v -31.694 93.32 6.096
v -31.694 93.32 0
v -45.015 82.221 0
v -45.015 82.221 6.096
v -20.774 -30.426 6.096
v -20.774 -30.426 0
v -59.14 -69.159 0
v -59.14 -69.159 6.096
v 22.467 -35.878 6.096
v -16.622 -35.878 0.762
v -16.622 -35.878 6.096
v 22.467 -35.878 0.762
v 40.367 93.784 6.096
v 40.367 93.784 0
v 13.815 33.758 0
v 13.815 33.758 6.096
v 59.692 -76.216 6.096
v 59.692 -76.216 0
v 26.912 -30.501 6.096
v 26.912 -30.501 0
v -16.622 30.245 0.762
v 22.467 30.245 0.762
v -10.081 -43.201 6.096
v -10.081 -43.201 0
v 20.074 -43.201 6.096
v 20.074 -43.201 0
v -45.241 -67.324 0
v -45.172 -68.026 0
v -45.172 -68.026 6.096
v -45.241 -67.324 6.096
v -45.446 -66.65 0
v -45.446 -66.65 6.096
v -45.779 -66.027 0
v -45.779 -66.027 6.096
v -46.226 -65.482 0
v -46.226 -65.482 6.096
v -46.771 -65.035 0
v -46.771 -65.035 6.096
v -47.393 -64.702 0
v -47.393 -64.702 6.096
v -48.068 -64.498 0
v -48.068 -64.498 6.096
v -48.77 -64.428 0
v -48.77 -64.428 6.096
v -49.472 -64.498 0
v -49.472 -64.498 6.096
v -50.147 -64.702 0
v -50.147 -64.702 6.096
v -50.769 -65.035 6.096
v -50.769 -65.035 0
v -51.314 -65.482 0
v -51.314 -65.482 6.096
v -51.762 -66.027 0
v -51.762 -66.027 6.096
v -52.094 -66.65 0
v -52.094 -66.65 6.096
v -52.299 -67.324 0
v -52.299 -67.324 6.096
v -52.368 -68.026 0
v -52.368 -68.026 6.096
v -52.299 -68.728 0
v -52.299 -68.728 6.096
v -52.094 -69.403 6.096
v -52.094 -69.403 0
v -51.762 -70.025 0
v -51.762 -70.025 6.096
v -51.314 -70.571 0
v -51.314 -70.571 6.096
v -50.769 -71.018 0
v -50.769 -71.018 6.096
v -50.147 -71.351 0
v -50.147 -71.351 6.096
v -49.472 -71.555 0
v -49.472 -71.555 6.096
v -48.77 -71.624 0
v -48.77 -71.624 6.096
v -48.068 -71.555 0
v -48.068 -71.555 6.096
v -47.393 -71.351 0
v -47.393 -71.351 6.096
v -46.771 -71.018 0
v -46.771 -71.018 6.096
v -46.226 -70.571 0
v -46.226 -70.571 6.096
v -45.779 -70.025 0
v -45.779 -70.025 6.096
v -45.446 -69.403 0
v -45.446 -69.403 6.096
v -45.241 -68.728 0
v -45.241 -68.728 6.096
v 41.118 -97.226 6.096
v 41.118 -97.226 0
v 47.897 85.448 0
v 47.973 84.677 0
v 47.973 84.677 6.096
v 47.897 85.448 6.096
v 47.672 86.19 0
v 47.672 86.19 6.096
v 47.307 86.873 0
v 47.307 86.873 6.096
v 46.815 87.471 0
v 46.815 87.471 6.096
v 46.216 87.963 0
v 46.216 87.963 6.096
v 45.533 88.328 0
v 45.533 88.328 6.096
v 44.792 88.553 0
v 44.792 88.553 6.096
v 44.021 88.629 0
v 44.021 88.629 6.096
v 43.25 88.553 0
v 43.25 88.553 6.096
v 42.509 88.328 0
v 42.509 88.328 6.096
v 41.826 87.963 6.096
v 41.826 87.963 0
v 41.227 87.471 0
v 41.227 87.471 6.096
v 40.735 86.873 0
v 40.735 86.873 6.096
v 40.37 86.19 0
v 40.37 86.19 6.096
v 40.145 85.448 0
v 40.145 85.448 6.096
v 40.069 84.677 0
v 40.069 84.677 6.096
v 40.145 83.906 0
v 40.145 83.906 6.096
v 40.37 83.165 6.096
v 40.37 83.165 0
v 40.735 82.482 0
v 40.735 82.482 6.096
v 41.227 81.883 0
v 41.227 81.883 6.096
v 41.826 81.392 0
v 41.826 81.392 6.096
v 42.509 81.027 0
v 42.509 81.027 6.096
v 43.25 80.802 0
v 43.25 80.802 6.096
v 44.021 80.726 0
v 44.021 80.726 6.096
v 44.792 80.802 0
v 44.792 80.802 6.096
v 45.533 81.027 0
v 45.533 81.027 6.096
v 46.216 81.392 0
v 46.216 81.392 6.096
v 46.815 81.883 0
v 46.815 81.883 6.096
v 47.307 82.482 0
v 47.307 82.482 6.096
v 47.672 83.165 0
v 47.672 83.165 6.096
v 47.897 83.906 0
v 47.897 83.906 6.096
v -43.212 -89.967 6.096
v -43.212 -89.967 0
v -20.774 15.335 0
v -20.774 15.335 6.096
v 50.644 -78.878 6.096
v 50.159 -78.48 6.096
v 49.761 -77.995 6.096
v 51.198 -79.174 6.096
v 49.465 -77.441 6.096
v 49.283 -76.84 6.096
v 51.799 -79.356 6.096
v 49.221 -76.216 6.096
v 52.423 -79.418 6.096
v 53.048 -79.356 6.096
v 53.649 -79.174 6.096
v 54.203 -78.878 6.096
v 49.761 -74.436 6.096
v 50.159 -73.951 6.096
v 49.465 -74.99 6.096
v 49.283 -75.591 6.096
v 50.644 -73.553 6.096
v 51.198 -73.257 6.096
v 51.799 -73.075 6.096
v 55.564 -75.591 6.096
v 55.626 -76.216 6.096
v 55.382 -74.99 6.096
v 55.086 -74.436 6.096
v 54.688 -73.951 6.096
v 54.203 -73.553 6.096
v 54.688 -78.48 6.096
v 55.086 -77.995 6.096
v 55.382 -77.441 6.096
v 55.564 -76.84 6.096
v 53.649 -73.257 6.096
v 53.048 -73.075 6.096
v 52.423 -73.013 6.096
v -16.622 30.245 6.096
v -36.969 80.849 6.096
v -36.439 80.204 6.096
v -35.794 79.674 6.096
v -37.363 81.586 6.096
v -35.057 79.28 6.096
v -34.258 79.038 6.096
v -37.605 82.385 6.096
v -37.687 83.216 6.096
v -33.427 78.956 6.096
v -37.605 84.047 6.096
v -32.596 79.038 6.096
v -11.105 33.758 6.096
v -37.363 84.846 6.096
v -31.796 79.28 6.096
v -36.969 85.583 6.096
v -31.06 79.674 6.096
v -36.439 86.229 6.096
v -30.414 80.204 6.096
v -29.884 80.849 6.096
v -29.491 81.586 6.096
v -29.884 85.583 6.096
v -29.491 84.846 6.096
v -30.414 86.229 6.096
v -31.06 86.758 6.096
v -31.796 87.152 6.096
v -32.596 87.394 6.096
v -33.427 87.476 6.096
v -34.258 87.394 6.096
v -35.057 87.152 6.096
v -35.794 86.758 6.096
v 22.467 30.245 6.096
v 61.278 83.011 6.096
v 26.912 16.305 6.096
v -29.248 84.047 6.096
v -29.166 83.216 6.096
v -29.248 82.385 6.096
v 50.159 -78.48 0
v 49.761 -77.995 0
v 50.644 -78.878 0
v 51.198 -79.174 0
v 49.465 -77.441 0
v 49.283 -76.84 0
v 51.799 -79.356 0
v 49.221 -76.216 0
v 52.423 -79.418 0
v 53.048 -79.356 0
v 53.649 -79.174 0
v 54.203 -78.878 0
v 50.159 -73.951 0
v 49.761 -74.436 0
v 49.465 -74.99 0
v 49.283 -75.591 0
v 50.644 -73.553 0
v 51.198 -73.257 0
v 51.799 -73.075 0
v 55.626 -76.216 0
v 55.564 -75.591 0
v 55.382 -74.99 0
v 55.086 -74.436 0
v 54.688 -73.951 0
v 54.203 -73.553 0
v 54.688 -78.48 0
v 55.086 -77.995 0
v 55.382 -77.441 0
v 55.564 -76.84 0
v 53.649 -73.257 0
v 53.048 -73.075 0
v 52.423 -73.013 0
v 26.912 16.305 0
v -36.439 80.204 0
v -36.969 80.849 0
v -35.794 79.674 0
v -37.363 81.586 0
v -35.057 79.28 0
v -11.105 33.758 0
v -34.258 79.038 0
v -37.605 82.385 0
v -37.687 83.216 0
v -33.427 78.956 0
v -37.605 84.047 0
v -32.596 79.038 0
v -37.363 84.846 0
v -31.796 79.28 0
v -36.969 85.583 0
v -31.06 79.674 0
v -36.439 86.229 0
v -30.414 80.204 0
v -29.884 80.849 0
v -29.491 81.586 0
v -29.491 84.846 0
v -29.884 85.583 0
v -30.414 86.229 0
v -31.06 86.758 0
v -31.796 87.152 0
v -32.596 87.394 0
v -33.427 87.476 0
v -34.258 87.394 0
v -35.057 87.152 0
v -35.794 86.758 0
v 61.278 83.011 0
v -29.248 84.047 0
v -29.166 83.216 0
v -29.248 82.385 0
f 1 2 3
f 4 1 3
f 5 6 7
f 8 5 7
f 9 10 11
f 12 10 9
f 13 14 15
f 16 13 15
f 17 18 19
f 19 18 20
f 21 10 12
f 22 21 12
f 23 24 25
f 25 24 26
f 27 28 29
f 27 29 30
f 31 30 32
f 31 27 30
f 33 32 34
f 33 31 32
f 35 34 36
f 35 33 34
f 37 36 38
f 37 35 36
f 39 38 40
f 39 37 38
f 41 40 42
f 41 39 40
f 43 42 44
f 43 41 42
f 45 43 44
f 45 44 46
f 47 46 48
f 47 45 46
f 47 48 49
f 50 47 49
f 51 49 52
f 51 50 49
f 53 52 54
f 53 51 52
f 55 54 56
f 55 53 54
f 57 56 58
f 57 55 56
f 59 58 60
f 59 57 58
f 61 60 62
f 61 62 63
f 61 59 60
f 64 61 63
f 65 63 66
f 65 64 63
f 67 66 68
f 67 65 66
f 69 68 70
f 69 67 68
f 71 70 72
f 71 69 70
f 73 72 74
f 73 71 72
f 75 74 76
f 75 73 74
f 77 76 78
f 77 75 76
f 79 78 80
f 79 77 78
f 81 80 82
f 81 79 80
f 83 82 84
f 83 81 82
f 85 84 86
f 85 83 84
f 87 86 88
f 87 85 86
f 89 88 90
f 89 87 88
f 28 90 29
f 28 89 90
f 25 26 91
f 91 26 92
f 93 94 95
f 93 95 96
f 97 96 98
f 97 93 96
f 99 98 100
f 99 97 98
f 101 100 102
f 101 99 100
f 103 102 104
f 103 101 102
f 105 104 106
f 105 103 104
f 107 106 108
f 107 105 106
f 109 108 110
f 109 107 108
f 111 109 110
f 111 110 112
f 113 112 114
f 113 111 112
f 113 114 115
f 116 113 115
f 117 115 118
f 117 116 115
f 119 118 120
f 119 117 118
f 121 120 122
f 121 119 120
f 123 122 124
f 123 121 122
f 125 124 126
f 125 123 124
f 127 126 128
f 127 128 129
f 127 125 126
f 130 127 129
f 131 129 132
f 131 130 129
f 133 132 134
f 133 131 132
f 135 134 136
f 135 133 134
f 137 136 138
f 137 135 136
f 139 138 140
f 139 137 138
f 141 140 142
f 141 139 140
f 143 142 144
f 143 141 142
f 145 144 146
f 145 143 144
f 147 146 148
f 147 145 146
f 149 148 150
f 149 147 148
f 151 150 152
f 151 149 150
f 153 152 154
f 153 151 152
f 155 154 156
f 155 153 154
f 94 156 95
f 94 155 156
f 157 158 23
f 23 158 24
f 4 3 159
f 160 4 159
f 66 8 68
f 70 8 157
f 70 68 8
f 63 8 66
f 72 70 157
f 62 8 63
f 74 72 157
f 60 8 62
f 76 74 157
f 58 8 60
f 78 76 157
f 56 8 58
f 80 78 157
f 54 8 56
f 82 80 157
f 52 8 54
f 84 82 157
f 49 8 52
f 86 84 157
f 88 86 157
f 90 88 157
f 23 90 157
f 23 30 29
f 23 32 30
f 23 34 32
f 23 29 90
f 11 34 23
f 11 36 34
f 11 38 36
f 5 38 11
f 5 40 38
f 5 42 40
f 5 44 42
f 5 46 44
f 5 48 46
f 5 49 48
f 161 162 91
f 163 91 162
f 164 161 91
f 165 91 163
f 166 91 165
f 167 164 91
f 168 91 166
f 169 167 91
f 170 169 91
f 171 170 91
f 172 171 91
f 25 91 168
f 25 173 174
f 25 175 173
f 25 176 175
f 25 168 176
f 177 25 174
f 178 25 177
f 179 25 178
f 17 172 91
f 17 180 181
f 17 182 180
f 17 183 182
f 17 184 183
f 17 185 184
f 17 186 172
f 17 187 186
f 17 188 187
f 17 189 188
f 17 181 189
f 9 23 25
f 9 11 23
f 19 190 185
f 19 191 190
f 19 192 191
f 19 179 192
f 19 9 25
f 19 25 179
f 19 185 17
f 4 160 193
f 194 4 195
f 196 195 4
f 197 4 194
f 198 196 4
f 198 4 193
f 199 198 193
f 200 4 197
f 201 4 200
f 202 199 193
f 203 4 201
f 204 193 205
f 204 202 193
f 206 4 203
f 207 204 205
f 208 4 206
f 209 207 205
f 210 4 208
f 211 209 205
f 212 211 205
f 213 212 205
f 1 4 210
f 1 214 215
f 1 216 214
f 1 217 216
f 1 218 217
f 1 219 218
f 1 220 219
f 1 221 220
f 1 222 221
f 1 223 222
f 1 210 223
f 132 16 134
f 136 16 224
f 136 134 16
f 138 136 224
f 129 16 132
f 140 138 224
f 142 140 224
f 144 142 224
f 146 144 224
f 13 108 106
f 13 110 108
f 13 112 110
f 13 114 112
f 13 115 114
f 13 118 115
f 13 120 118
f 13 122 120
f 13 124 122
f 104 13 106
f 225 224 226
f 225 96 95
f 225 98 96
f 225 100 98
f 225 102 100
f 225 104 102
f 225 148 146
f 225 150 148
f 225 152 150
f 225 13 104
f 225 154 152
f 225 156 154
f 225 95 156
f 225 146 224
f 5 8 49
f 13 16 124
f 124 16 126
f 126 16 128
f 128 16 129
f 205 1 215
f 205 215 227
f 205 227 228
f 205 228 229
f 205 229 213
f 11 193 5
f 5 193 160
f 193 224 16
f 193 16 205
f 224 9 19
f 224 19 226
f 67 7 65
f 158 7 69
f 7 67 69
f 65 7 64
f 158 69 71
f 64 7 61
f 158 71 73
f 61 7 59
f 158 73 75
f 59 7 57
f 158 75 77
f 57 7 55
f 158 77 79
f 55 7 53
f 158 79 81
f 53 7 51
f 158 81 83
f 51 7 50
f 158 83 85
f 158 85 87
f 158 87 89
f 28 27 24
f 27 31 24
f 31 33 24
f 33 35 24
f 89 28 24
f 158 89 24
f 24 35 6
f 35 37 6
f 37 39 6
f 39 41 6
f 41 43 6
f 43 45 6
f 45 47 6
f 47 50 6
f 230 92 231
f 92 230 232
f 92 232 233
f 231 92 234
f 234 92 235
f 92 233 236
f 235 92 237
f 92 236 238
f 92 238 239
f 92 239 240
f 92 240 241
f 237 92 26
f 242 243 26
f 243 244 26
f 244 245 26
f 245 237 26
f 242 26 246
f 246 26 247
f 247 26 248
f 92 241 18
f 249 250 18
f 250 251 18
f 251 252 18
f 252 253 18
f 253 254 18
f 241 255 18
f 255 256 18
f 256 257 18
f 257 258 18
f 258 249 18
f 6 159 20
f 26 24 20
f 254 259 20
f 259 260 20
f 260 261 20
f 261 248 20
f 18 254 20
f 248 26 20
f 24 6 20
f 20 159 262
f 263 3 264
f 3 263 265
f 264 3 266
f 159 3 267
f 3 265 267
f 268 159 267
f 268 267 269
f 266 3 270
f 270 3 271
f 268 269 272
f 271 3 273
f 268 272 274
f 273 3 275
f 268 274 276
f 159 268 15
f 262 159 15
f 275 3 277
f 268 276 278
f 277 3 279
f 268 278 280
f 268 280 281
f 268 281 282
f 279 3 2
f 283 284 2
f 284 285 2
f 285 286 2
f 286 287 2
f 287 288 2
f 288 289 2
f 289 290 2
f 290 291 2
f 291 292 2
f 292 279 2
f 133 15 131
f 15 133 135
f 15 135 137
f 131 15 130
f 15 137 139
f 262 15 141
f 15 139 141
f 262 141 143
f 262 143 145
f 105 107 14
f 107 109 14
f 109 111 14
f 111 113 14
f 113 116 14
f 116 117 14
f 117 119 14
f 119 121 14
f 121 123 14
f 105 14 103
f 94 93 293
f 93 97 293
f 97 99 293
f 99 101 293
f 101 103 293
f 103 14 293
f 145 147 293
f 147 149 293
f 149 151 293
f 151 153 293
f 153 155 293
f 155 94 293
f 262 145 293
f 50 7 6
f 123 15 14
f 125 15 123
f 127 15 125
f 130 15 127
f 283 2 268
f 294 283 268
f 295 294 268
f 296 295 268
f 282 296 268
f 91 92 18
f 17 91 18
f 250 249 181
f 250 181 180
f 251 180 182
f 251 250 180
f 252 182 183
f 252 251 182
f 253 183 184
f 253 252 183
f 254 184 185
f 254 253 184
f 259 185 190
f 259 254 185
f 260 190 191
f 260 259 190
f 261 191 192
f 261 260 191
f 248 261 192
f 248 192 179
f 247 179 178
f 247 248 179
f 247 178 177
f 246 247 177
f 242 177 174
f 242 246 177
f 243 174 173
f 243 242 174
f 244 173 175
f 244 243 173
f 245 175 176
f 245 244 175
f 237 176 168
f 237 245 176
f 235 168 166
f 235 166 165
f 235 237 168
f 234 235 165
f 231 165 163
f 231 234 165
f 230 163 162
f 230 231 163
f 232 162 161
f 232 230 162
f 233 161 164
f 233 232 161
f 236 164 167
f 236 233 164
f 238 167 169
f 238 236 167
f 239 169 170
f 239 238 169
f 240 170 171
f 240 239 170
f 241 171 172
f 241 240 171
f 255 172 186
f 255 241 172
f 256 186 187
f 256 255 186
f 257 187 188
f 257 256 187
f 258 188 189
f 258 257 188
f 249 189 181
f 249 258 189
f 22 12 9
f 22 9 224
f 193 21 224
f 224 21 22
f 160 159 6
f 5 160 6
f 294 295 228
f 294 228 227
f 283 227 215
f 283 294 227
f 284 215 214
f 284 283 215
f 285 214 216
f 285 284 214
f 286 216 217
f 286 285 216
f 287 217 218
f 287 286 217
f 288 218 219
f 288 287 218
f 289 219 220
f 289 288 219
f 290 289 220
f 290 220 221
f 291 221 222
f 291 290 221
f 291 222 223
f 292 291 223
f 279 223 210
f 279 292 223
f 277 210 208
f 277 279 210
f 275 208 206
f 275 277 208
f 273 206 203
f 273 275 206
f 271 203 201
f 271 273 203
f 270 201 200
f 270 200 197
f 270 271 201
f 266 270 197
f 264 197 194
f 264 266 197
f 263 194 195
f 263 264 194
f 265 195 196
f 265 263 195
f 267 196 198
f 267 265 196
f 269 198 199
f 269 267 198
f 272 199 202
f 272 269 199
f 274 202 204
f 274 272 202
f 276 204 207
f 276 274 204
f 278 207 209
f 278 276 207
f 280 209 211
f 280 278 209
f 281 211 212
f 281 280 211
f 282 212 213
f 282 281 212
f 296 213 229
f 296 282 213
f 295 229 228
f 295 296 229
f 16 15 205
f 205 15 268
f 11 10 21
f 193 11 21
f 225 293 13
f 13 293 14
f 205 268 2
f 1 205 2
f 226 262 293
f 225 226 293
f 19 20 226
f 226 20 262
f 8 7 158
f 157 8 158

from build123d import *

# Parameters (mm, degrees)
F0_W     = 39.0892345458
F0_H     = 66.1229081452
F1_DEPTH = 0.762
F0_R     = 4.2603265816
F0_R_2   = 3.9515412254
F0_R_3   = 3.5979856565
F0_R_4   = 3.2023821092
F2_DEPTH = 6.096


# Not quite as in the source:
# - a feature of the source that left no trace in its solid (it failed there, or was rolled back) is left out


with BuildPart() as f1:
    # F0 (on Top) → F1 (new body)
    with BuildSketch(Plane.XY):
        with Locations((2.9225489125, -2.8168093413)):
            Rectangle(F0_W, F0_H)
    extrude(amount=F1_DEPTH)

    # F0 (on Top) → F2 (join)
    with BuildSketch(Plane.XY):
        Polygon((-20.7744576037, 15.3352888301), (-20.7744576037, 33.758495003), (-11.104892008, 33.758495003), (-31.6940061748, 93.3202803135), (-45.0146831572, 82.2209268808), align=None)
        with Locations((-33.4267839789, 83.2160338759)):
            Circle(F0_R, mode=Mode.SUBTRACT)
        Polygon((-11.104892008, 33.758495003), (-20.7744576037, 33.758495003), (-20.7744576037, 15.3352888301), (-20.7744576037, -30.4260663688), (-20.7744576037, -43.2014353573), (-10.0806253031, -43.2014353573), (20.0740266591, -43.2014353573), (26.9123706967, -43.2014353573), (26.9123706967, -30.5006168783), (26.9123706967, 16.304789111), (26.9123706967, 33.758495003), (13.8152288273, 33.758495003), align=None)
        with Locations((2.9225489125, -2.8168093413)):
            Rectangle(F0_W, F0_H, mode=Mode.SUBTRACT)
        Polygon((40.3667656029, 93.7842203212), (13.8152288273, 33.758495003), (26.9123706967, 33.758495003), (26.9123706967, 16.304789111), (61.2783841789, 83.0108523369), align=None)
        with Locations((44.0210402012, 84.6773162484)):
            Circle(F0_R_2, mode=Mode.SUBTRACT)
        Polygon((-20.7744576037, -43.2014353573), (-20.7744576037, -30.4260663688), (-59.1404661536, -69.1590458155), (-43.2117395103, -89.9672359228), (-10.0806253031, -43.2014353573), align=None)
        with Locations((-48.7702228129, -68.0264160037)):
            Circle(F0_R_3, mode=Mode.SUBTRACT)
        Polygon((59.6924833953, -76.2155726552), (26.9123706967, -30.5006168783), (26.9123706967, -43.2014353573), (20.0740266591, -43.2014353573), (41.1184616387, -97.2259193659), align=None)
        with Locations((52.4233952165, -76.2155726552)):
            Circle(F0_R_4, mode=Mode.SUBTRACT)
    extrude(amount=F2_DEPTH)


solid = f1.part
